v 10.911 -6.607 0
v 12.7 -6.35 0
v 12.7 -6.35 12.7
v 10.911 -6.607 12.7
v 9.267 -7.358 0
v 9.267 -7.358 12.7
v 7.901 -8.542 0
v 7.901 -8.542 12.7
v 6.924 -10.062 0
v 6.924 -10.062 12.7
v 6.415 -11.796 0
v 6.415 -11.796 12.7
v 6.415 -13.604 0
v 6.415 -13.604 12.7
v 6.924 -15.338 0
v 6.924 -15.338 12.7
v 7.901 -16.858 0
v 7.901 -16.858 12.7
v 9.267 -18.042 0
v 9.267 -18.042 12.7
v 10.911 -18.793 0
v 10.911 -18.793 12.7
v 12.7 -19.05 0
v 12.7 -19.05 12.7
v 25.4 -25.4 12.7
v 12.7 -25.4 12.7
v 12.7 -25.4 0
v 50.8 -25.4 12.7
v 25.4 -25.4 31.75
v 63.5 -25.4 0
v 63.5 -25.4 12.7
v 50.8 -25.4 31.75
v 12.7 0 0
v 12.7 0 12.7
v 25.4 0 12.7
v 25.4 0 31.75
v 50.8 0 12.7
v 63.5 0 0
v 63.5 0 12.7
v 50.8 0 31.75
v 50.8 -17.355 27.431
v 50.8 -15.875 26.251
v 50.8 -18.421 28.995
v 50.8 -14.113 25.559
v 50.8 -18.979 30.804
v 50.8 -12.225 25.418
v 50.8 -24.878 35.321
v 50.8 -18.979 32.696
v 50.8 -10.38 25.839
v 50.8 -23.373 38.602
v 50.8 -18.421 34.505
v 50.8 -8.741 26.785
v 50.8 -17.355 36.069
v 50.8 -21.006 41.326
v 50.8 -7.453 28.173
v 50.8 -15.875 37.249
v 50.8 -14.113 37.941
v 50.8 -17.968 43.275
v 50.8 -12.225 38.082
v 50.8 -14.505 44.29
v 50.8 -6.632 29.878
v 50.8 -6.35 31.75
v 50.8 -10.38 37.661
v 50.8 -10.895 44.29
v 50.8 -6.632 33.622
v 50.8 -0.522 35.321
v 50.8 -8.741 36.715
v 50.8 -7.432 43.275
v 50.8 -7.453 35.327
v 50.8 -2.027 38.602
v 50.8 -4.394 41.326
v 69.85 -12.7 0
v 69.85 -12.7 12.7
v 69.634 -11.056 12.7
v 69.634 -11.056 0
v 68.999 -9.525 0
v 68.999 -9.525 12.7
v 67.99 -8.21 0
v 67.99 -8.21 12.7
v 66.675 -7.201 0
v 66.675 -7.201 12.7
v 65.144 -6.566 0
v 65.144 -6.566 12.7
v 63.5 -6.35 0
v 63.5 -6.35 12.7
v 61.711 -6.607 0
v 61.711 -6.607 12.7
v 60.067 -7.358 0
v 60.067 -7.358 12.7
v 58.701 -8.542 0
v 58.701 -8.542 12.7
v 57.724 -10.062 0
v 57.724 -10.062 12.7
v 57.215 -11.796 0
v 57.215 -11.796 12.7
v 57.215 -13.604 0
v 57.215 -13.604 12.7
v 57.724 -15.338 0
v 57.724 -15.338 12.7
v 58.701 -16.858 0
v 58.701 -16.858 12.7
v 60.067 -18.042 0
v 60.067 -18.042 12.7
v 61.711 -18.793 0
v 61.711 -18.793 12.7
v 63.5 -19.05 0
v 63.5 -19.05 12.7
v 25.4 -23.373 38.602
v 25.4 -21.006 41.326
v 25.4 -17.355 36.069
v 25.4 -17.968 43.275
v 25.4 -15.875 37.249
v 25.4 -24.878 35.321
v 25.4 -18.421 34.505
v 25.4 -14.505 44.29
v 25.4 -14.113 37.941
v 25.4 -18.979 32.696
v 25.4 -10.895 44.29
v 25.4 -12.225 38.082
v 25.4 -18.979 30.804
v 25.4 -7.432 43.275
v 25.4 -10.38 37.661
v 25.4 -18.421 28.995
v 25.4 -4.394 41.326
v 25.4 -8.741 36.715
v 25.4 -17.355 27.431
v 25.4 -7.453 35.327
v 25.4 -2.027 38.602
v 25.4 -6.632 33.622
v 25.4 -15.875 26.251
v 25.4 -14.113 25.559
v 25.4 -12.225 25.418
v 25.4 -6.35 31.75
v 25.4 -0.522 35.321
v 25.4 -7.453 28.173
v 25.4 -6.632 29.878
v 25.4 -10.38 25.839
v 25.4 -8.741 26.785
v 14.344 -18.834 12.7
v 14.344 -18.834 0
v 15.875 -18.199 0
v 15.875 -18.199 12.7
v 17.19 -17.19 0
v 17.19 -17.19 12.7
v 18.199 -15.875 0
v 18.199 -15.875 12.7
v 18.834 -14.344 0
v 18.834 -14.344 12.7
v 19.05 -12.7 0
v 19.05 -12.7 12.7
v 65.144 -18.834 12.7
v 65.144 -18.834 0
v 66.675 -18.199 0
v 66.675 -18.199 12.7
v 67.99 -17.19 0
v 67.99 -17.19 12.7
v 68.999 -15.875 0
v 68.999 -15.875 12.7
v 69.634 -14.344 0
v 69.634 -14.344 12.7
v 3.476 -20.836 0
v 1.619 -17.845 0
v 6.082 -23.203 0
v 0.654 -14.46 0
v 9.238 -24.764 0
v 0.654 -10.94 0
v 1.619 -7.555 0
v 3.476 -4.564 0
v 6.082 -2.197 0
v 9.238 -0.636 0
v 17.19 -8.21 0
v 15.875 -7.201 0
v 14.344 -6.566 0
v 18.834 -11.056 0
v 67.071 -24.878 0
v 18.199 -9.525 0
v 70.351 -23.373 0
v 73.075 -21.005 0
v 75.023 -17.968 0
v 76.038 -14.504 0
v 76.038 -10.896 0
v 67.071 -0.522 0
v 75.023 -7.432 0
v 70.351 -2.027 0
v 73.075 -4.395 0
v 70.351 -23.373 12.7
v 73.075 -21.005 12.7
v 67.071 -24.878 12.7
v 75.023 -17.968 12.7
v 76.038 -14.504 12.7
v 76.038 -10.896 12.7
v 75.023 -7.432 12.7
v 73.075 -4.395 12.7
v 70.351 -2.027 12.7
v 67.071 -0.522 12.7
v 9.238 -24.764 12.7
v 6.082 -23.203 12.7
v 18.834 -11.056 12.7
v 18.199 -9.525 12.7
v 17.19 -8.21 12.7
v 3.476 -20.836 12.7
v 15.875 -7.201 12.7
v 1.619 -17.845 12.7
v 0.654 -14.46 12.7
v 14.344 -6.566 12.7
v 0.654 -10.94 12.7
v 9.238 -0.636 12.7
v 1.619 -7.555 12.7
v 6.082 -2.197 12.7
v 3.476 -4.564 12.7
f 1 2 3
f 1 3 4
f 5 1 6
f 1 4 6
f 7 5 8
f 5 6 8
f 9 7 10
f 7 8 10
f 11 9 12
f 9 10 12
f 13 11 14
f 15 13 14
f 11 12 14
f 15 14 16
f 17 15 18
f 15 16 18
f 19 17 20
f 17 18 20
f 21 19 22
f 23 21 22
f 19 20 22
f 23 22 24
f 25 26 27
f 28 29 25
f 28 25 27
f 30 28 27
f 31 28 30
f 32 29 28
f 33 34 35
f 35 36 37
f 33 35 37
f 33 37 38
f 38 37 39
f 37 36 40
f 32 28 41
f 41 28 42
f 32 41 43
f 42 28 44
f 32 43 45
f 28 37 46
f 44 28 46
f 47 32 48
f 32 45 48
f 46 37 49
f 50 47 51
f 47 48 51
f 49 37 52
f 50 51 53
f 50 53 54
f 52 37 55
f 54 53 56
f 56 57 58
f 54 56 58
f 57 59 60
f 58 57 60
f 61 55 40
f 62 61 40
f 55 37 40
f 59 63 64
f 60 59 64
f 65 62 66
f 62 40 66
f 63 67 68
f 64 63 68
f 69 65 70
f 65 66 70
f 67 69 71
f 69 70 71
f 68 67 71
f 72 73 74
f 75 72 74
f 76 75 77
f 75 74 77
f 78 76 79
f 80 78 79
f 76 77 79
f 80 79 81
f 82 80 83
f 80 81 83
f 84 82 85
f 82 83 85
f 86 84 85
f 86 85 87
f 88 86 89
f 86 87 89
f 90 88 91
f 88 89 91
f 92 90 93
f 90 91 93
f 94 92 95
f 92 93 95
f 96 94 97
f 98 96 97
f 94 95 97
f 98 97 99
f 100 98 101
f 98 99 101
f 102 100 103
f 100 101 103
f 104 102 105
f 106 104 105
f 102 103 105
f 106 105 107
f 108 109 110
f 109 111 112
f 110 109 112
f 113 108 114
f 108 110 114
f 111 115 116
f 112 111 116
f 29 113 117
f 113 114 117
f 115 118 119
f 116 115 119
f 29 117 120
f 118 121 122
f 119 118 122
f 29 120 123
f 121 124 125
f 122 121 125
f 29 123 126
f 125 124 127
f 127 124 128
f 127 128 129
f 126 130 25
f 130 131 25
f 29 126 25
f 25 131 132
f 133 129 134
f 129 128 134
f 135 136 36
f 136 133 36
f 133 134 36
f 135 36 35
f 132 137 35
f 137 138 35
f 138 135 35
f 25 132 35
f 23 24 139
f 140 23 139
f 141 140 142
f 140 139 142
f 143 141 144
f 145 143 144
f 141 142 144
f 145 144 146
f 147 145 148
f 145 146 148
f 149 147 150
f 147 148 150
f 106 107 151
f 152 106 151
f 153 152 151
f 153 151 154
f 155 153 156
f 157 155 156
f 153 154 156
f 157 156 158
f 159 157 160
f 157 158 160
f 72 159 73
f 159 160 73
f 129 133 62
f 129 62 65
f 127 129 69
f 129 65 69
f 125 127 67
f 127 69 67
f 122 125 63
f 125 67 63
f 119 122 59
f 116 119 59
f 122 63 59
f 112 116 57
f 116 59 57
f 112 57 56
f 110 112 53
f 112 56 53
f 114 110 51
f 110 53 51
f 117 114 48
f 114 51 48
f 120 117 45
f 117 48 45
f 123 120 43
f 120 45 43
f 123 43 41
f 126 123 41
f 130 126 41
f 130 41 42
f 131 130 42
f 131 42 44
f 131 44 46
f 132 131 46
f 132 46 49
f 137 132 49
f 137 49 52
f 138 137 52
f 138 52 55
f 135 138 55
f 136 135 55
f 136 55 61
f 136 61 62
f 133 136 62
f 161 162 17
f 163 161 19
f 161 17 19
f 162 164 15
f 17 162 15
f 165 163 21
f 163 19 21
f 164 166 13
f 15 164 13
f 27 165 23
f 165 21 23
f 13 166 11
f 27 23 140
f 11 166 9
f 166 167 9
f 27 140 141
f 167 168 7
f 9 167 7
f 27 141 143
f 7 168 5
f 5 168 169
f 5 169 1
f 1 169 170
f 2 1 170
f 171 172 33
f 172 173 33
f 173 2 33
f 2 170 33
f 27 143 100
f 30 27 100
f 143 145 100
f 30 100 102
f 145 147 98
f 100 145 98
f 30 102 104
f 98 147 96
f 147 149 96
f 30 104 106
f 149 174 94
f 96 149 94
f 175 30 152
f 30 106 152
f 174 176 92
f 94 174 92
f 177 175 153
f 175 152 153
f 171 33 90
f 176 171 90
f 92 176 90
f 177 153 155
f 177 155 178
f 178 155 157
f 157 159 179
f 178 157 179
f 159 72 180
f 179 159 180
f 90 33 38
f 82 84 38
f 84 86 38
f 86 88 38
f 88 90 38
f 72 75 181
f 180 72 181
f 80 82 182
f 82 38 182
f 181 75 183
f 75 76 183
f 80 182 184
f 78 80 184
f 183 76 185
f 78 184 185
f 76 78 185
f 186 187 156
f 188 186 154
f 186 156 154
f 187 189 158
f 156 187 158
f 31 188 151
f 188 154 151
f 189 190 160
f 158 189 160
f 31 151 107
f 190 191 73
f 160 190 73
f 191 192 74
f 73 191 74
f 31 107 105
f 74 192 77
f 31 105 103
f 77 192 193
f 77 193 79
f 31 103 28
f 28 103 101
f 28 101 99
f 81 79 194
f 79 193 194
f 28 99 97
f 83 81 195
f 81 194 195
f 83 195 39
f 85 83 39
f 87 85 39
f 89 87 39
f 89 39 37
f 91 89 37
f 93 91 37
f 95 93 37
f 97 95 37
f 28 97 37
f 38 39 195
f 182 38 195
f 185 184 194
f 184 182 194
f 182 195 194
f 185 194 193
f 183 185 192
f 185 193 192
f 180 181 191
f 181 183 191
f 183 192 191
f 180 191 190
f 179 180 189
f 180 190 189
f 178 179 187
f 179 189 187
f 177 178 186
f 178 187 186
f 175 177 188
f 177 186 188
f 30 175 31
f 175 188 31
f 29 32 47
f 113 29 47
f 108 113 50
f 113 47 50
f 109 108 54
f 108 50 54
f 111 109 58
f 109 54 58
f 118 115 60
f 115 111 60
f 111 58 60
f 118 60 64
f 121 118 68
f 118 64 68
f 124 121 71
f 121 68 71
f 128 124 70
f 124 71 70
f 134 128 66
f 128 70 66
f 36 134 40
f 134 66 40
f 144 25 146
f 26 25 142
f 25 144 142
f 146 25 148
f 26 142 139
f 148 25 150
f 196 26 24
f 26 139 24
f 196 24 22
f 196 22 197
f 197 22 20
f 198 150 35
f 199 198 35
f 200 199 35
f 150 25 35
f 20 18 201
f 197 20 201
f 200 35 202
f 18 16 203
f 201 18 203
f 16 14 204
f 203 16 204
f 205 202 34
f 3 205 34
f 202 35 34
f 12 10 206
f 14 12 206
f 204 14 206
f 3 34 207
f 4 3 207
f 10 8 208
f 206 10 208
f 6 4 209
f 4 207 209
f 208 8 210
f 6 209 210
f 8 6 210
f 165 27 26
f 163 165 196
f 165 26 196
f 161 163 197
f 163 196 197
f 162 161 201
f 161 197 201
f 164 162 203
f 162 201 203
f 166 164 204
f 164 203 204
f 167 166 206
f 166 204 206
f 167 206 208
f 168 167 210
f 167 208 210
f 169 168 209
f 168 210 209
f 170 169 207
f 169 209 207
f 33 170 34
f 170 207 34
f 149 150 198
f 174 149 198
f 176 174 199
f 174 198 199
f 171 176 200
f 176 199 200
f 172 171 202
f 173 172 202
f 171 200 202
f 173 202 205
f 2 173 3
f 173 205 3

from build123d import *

# Parameters (mm, degrees)
F1_DEPTH = 25.4
F3_DEPTH = 50.801
F5_DEPTH = 12.701
F7_DEPTH = 12.701


with BuildPart() as f1:
    # F0 (on Front) → F1 (new body)
    with BuildSketch(Plane.XZ):
        Polygon((0, 12.7), (0, 0), (76.2, 0), (76.2, 12.7), (50.8, 12.7), (50.8, 44.45), (25.4, 44.45), (25.4, 12.7), align=None)
    extrude(amount=F1_DEPTH)

    # F2 (on face) → F3 (cut, through all)
    with BuildSketch(Plane.YZ.offset(50.8)):
        with BuildLine():
            ThreePointArc((-19.05, 31.75), (-12.7, 25.4), (-6.35, 31.75))
            Line((-6.35, 31.75), (-19.05, 31.75))
        make_face()
        with BuildLine():
            Line((-19.05, 31.75), (-6.35, 31.75))
            ThreePointArc((-6.35, 31.75), (-12.7, 38.1), (-19.05, 31.75))
        make_face()
        with BuildLine():
            ThreePointArc((-25.4, 31.75), (-12.7, 44.4189396796), (0, 31.75))
            Line((0, 31.75), (0, 44.45))
            Line((0, 44.45), (-25.4, 44.45))
            Line((-25.4, 44.45), (-25.4, 31.75))
        make_face()
    extrude(amount=-F3_DEPTH, mode=Mode.SUBTRACT)

    # F4 (on face) → F5 (cut, through all)
    with BuildSketch(Plane.XY.offset(12.7)):
        with BuildLine():
            ThreePointArc((69.85, -12.7), (67.9901280605, -8.2098719395), (63.5, -6.35))
            Line((63.5, -6.35), (63.5, -19.05))
            ThreePointArc((63.5, -19.05), (67.9901280605, -17.1901280605), (69.85, -12.7))
        make_face()
        with BuildLine():
            Line((63.5, -19.05), (63.5, -6.35))
            ThreePointArc((63.5, -6.35), (57.15, -12.7), (63.5, -19.05))
        make_face()
        with BuildLine():
            Line((76.2, 0), (63.5, 0))
            ThreePointArc((63.5, 0), (76.1671814636, -12.7), (63.5, -25.4))
            Line((63.5, -25.4), (76.2, -25.4))
            Line((76.2, -25.4), (76.2, 0))
        make_face()
    extrude(amount=-F5_DEPTH, mode=Mode.SUBTRACT)

    # F6 (on face) → F7 (cut, through all)
    with BuildSketch(Plane.XY.offset(12.7)):
        with BuildLine():
            ThreePointArc((19.05, -12.7), (17.1901280605, -8.2098719395), (12.7, -6.35))
            Line((12.7, -6.35), (12.7, -19.05))
            ThreePointArc((12.7, -19.05), (17.1901280605, -17.1901280605), (19.05, -12.7))
        make_face()
        with BuildLine():
            Line((12.7, -19.05), (12.7, -6.35))
            ThreePointArc((12.7, -6.35), (6.35, -12.7), (12.7, -19.05))
        make_face()
        with BuildLine():
            ThreePointArc((12.7, -25.4), (0.5314257949, -12.7), (12.7, 0))
            Line((12.7, 0), (0, 0))
            Line((0, 0), (0, -25.4))
            Line((0, -25.4), (12.7, -25.4))
        make_face()
    extrude(amount=-F7_DEPTH, mode=Mode.SUBTRACT)


solid = f1.part
